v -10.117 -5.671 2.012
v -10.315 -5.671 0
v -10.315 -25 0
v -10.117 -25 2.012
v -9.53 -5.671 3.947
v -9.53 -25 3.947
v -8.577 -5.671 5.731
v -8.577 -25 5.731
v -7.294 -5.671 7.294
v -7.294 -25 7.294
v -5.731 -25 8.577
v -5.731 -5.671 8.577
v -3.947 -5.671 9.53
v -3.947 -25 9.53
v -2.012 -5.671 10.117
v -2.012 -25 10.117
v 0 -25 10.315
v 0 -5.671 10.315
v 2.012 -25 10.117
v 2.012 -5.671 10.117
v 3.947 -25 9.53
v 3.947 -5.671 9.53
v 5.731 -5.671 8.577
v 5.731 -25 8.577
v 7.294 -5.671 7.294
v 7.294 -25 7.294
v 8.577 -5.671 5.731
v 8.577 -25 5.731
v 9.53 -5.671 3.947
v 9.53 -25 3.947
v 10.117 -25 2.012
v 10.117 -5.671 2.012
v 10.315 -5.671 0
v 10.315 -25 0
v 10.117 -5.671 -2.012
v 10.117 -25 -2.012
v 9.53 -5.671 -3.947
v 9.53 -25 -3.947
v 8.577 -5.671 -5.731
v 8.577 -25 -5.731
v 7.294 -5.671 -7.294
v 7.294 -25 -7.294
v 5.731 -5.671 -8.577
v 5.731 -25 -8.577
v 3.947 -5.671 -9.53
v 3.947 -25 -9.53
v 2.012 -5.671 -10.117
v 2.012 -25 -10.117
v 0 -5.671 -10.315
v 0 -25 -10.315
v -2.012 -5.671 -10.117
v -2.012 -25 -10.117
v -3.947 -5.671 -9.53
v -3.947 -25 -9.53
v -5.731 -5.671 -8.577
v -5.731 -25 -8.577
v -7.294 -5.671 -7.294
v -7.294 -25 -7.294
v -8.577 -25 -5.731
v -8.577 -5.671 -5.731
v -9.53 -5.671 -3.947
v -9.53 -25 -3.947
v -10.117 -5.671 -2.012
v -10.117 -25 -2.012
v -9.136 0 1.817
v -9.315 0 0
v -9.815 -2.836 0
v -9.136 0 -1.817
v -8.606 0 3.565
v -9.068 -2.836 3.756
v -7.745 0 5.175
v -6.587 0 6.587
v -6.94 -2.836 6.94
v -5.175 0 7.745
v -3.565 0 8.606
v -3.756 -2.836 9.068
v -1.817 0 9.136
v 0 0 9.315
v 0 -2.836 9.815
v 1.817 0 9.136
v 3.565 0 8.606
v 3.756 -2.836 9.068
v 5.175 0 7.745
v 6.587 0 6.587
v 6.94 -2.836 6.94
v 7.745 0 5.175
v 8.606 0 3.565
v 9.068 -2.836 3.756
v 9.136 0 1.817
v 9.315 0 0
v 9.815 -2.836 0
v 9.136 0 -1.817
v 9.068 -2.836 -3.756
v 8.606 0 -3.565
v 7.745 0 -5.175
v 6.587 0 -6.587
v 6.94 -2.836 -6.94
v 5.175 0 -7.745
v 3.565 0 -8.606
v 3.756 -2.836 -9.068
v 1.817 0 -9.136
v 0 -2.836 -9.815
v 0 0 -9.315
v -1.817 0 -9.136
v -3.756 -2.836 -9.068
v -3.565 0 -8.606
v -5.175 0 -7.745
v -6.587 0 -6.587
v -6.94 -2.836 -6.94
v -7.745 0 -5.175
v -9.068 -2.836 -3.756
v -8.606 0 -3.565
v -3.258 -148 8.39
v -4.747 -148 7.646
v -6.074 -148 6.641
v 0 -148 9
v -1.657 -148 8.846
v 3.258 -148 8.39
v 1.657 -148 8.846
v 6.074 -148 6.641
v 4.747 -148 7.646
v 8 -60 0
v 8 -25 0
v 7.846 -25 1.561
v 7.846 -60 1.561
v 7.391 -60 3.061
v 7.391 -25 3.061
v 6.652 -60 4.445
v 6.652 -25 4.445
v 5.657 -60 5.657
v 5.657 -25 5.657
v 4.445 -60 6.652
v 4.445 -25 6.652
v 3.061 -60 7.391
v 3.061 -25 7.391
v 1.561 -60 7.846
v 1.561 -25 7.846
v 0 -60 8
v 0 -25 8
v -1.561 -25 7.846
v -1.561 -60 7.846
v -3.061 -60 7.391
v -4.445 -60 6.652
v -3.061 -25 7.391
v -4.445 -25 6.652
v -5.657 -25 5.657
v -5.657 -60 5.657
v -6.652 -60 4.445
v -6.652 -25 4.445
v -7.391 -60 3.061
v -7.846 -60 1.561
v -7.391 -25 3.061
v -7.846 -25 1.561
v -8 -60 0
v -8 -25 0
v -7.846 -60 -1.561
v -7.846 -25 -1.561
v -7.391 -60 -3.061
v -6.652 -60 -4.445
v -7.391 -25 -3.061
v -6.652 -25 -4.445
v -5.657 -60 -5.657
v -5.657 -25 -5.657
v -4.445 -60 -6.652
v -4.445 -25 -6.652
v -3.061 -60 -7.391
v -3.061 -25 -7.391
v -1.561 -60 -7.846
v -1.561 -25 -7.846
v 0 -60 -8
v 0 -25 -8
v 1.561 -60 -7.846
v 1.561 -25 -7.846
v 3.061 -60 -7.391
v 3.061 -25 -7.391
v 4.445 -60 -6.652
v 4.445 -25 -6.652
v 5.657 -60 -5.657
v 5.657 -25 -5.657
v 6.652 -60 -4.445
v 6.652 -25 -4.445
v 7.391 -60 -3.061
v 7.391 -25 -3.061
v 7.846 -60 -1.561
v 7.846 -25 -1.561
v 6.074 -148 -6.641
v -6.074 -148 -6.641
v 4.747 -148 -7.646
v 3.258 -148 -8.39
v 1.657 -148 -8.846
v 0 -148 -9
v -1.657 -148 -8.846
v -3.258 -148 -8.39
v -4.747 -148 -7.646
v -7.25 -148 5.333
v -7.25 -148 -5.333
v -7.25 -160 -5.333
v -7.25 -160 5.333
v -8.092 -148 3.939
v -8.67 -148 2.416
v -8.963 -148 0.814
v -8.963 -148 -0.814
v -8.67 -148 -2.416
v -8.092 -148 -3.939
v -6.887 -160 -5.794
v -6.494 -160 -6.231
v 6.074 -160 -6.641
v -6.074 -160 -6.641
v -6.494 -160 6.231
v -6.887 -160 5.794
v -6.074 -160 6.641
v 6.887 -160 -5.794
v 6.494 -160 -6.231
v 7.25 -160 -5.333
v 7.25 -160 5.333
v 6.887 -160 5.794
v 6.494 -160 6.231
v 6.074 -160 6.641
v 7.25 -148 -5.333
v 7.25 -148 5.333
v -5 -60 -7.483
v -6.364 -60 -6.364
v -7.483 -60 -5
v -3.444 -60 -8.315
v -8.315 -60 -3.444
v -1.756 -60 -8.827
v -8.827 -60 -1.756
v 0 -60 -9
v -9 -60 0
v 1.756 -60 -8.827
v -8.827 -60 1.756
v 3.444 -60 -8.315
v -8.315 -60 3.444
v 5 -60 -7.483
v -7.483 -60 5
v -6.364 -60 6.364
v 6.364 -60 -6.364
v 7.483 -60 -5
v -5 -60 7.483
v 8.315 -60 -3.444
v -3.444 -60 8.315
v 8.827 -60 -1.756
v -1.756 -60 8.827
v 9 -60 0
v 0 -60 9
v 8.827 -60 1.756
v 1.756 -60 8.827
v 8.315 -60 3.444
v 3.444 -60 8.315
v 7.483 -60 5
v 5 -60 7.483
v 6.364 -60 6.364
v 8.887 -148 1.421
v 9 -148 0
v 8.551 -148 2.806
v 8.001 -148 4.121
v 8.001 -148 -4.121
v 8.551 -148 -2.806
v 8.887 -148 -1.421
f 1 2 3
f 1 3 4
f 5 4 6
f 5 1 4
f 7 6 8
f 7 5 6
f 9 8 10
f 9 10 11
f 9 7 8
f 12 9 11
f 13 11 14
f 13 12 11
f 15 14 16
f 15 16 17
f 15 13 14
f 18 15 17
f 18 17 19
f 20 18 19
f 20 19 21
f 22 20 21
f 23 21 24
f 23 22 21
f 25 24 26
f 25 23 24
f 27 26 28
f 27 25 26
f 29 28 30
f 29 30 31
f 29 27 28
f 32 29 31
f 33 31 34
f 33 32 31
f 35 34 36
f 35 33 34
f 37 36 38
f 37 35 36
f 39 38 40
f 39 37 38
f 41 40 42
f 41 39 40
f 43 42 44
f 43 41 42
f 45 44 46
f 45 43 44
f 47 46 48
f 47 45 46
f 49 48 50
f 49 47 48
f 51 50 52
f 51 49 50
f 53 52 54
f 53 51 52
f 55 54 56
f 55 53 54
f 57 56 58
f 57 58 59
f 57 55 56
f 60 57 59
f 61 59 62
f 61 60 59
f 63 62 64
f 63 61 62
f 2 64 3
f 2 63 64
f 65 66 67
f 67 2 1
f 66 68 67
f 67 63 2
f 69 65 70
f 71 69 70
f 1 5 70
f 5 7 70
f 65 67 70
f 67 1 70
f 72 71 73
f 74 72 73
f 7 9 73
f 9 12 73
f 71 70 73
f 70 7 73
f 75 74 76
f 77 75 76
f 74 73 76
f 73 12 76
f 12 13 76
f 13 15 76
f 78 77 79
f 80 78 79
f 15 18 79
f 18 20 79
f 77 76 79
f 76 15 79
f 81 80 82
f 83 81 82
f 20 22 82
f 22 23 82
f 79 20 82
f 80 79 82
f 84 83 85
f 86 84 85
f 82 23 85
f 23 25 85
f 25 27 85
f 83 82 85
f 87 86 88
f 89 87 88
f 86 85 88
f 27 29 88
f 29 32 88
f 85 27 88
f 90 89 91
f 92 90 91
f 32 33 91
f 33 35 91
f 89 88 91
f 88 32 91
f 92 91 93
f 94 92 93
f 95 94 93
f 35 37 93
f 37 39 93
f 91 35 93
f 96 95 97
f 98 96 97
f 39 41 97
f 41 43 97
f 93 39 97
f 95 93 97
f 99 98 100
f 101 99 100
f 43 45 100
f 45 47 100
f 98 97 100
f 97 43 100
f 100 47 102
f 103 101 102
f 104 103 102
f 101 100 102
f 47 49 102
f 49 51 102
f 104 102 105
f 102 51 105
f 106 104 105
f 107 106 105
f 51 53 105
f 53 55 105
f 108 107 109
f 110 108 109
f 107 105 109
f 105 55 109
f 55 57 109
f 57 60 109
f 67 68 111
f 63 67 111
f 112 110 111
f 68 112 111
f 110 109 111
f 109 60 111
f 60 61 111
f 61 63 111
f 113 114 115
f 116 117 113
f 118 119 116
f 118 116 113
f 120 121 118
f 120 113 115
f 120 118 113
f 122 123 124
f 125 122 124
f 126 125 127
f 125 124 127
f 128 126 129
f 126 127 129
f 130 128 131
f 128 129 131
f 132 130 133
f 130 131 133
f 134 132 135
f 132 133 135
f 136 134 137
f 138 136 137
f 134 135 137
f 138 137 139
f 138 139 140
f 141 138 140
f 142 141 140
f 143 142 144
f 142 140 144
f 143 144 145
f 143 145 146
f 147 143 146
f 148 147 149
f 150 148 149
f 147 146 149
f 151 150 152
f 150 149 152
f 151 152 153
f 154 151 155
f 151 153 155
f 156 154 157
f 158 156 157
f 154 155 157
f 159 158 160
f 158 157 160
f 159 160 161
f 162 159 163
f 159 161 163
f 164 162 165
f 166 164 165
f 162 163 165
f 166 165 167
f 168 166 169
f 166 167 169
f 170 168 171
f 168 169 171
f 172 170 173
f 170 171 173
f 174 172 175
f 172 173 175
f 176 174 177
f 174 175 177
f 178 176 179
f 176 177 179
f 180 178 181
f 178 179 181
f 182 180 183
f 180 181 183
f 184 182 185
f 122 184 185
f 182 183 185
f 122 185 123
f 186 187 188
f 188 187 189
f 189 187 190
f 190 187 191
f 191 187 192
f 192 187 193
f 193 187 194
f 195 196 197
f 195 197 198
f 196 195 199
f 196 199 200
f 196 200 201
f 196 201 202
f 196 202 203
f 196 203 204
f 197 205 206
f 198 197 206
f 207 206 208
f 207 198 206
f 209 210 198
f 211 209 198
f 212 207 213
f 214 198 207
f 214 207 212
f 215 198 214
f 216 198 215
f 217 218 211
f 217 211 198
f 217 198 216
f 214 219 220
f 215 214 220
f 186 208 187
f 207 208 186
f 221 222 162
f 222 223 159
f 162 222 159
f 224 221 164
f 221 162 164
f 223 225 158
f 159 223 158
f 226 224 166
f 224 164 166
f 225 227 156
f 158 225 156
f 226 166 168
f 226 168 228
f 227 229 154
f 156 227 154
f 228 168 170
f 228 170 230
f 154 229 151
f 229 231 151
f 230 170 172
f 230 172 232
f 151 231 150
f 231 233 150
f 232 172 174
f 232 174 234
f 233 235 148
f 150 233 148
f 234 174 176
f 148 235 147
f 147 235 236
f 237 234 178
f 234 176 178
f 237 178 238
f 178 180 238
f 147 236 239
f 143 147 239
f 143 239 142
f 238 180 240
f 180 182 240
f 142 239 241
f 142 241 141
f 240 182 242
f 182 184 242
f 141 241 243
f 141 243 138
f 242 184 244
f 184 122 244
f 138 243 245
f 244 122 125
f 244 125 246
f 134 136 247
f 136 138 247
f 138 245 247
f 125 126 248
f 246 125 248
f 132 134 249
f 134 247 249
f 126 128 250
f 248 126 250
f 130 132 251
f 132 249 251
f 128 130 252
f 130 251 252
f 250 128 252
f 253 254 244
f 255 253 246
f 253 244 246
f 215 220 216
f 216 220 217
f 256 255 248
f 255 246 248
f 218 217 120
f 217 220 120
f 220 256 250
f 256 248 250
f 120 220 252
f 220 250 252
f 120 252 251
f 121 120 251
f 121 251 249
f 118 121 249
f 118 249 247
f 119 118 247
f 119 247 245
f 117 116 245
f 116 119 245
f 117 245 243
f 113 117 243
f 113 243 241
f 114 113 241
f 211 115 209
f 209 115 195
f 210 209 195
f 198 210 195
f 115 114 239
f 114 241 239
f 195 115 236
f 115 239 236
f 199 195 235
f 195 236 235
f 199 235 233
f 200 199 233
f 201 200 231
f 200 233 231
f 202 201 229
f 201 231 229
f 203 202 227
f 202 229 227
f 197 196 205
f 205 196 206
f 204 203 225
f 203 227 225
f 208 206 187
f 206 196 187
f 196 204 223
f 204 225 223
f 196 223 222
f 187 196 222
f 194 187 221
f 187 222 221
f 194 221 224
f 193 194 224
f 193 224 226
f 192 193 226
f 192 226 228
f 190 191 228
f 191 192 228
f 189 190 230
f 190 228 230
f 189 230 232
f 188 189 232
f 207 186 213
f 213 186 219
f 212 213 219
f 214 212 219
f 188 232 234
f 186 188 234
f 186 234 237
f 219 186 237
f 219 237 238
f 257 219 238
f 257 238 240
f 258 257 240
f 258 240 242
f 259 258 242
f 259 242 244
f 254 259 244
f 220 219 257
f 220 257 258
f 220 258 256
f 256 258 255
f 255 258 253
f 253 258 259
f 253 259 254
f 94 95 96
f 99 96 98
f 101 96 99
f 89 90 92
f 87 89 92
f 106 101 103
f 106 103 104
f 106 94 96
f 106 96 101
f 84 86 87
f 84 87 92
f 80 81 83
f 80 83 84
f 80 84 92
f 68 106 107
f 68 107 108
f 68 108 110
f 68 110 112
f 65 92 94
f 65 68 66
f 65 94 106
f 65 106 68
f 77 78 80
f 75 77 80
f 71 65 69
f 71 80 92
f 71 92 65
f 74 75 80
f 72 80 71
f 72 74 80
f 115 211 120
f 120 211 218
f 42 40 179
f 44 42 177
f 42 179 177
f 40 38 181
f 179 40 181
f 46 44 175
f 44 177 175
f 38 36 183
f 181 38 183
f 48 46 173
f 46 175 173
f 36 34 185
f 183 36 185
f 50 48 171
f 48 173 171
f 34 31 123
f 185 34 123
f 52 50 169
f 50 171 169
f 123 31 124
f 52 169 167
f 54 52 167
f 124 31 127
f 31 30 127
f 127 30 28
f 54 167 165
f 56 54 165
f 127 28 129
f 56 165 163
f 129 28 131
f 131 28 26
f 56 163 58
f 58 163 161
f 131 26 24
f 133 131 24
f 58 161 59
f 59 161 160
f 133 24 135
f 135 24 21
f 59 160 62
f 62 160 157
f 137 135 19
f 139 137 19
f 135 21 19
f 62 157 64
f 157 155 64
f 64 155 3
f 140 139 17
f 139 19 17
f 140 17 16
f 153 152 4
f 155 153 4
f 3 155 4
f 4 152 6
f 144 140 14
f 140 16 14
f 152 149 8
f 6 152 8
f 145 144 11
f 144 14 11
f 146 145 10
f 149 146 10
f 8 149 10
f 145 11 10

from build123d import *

# Parameters (mm, degrees)
F0_R     = 9
F1_DEPTH = 160
F2_W     = 23.4179981053
F2_H     = 22.6416159421
F2_W_2   = 14.5
F2_H_2   = 13.2822632294
F3_DEPTH = 12
F4_R     = 10.315
F5_DEPTH = 25
F6_SIZE2 = 5.6712818196
F6_SIZE  = 1
F7_R     = 14.7612930143
F7_R_2   = 8
F8_DEPTH = 35


with BuildPart() as f1:
    # F0 (on Front) → F1 (new body)
    with BuildSketch(Plane.XZ):
        Circle(F0_R)
    extrude(amount=F1_DEPTH)

    # F2 (on face) → F3 (cut)
    with BuildSketch(Plane.XZ.offset(160)):
        Rectangle(F2_W, F2_H)
        Rectangle(F2_W_2, F2_H_2, mode=Mode.SUBTRACT)
    extrude(amount=-F3_DEPTH, mode=Mode.SUBTRACT)

    # F4 (on face) → F5 (join)
    with BuildSketch(Plane(origin=(0, 0, 0), x_dir=(-1, 0, 0), z_dir=(0, 1, 0))):
        Circle(F4_R)
    extrude(amount=-F5_DEPTH)

    # F6
    f6_edges = [f1.edges().sort_by_distance(p)[0] for p in [
        (10.315, 0, 0),
    ]]
    f6_side = f1.faces().sort_by_distance((0, 0, 0))[0]
    chamfer(f6_edges, length=F6_SIZE, length2=F6_SIZE2, reference=f6_side)

    # F7 (on face) → F8 (cut)
    with BuildSketch(Plane.XZ.offset(25)):
        Circle(F7_R)
        Circle(F7_R_2, mode=Mode.SUBTRACT)
    extrude(amount=F8_DEPTH, mode=Mode.SUBTRACT)


solid = f1.part
